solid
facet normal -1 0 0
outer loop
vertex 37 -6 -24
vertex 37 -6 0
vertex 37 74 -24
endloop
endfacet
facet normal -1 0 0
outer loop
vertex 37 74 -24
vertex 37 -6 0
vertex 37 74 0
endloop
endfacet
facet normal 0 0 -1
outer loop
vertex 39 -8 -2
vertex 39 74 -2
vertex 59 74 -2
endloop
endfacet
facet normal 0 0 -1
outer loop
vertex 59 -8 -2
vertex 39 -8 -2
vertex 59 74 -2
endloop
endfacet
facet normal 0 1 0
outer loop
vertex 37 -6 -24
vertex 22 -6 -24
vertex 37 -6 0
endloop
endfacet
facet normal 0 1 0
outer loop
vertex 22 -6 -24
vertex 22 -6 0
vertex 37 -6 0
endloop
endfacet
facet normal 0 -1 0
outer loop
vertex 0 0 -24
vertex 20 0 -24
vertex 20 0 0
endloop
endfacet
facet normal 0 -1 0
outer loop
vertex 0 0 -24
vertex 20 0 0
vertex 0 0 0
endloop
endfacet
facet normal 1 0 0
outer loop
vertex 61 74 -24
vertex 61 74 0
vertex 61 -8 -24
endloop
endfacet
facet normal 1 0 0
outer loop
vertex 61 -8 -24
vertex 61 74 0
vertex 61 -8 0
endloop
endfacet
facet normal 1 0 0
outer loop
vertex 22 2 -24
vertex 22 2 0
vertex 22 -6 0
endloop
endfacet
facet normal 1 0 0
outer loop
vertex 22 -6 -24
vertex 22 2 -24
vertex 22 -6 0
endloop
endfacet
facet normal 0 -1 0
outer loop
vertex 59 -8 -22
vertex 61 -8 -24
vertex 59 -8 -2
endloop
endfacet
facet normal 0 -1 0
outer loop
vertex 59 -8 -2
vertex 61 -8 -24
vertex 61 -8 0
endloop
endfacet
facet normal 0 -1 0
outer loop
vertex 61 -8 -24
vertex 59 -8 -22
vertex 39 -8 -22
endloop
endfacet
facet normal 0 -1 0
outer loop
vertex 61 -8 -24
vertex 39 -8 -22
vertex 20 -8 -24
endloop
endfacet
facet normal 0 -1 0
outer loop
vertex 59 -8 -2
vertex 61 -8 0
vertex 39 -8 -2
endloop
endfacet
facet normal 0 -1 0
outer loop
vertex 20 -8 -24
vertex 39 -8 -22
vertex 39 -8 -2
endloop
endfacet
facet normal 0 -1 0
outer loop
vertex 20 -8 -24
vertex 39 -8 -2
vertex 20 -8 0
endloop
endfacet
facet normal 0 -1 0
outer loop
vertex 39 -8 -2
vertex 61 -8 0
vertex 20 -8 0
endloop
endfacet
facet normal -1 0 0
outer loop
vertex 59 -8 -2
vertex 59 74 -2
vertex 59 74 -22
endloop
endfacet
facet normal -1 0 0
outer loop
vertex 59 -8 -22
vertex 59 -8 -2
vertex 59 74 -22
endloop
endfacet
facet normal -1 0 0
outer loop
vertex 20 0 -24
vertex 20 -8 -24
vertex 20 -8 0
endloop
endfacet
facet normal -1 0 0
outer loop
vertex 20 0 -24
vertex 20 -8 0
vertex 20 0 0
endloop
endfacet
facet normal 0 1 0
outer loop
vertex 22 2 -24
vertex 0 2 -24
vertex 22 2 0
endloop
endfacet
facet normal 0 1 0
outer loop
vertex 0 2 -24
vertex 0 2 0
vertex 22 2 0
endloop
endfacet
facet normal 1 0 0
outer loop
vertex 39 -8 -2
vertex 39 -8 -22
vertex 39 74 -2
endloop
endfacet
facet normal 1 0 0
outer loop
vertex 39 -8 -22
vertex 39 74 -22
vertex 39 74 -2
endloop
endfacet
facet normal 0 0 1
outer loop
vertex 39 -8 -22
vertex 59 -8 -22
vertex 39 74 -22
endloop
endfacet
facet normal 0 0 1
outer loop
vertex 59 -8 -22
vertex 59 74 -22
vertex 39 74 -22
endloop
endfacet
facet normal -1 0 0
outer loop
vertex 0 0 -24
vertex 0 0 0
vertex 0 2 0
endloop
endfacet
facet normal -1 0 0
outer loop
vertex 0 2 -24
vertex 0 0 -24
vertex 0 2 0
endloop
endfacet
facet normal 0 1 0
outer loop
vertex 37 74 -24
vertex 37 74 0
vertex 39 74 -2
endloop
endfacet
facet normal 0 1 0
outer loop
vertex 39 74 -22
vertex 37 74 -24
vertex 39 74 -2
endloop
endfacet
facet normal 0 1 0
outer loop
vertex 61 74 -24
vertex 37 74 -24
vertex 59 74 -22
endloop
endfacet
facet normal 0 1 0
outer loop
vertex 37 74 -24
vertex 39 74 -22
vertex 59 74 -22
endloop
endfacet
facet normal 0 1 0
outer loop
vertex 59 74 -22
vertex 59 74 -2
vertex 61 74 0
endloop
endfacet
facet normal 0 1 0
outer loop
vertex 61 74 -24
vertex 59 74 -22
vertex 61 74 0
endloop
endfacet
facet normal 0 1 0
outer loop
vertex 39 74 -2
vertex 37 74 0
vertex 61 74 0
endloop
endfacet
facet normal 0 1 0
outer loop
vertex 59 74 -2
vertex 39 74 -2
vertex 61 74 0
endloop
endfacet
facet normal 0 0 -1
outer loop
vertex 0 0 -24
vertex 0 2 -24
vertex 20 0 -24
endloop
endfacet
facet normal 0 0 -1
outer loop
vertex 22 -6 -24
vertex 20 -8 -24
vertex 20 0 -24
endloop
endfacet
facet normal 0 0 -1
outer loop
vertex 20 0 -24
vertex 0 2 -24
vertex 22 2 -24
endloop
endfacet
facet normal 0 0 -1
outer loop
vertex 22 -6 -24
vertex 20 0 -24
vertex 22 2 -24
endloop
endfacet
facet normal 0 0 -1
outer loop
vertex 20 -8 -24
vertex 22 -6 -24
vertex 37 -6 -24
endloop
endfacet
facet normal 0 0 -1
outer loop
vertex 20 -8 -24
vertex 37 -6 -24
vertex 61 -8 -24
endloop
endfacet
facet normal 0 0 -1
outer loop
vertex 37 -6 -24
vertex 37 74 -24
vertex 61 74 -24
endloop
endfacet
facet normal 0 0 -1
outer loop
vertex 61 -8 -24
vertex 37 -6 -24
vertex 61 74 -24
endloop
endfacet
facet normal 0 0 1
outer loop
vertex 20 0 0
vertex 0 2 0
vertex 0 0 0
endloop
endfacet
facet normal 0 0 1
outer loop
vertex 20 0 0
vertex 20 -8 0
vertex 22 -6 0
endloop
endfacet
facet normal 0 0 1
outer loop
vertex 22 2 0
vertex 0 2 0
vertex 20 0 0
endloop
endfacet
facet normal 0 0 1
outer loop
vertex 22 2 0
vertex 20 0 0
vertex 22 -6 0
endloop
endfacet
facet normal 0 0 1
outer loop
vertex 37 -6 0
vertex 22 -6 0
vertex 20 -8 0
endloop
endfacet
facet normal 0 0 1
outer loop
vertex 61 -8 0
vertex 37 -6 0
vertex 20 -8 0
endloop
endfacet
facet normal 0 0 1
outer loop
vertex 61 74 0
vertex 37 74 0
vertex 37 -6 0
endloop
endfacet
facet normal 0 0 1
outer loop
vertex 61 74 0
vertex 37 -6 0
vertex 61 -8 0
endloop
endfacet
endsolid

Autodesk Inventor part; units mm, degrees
ref_plane "YZ Plane" through (0, 0, 0) normal (1, 0, 0) x (0, 1, 0)
ref_plane "XZ Plane" through (0, 0, 0) normal (0, 1, 0) x (-1, 0, 0)
ref_plane "XY Plane" through (0, 0, 0) normal (0, 0, 1) x (1, 0, 0)
sketch "Skizze4" plane through (0, 0, 0) normal (0, 0, 1) x (1, 0, 0)
  line L0 (0, 0) -> (0, 2)
  line L1 (0, 2) -> (22, 2)
  line L2 (22, 2) -> (22, -6)
  line L3 (22, -6) -> (37, -6)
  line L4 (37, -6) -> (37, 74)
  line L5 (37, 74) -> (61, 74)
  line L6 (61, 74) -> (61, -8)
  line L7 (61, 74) -> (143, 74) construction
  line L8 (61, -8) -> (20, -8)
  line L9 (20, -8) -> (20, 0)
  line L10 (20, 0) -> (0, 0)
  dimension "d2" = 2
  dimension "d3" = 22
  dimension "d4" = 8
  dimension "d5" = 15
  dimension "d6" = 80
  dimension "d7" = 24
  dimension "d8" = 82
  dimension "d9" = 90
  dimension "d10" = 41
extrude "Extrusion3" add sketch "Skizze4" against normal blind 24
sketch "Skizze8" plane through (37, 74, 0) normal (0, 1, 0) x (1, 0, 0)
  line L0 (2, 2) -> (22, 2)
  line L1 (22, 2) -> (22, 22)
  line L2 (22, 22) -> (2, 22)
  line L3 (2, 22) -> (2, 2)
  point P0 (-37, 0)
  dimension "d23" = 20
  dimension "d24" = 20
extrude "Extrusion5" cut sketch "Skizze8" against normal blind 200
sketch "Sketch9" plane through (0, 2, 0) normal (0, 1, 0) x (1, 0, 0)
  point P0 (0, 0)
properties part number "flexibler_standfuß_v0.3"
